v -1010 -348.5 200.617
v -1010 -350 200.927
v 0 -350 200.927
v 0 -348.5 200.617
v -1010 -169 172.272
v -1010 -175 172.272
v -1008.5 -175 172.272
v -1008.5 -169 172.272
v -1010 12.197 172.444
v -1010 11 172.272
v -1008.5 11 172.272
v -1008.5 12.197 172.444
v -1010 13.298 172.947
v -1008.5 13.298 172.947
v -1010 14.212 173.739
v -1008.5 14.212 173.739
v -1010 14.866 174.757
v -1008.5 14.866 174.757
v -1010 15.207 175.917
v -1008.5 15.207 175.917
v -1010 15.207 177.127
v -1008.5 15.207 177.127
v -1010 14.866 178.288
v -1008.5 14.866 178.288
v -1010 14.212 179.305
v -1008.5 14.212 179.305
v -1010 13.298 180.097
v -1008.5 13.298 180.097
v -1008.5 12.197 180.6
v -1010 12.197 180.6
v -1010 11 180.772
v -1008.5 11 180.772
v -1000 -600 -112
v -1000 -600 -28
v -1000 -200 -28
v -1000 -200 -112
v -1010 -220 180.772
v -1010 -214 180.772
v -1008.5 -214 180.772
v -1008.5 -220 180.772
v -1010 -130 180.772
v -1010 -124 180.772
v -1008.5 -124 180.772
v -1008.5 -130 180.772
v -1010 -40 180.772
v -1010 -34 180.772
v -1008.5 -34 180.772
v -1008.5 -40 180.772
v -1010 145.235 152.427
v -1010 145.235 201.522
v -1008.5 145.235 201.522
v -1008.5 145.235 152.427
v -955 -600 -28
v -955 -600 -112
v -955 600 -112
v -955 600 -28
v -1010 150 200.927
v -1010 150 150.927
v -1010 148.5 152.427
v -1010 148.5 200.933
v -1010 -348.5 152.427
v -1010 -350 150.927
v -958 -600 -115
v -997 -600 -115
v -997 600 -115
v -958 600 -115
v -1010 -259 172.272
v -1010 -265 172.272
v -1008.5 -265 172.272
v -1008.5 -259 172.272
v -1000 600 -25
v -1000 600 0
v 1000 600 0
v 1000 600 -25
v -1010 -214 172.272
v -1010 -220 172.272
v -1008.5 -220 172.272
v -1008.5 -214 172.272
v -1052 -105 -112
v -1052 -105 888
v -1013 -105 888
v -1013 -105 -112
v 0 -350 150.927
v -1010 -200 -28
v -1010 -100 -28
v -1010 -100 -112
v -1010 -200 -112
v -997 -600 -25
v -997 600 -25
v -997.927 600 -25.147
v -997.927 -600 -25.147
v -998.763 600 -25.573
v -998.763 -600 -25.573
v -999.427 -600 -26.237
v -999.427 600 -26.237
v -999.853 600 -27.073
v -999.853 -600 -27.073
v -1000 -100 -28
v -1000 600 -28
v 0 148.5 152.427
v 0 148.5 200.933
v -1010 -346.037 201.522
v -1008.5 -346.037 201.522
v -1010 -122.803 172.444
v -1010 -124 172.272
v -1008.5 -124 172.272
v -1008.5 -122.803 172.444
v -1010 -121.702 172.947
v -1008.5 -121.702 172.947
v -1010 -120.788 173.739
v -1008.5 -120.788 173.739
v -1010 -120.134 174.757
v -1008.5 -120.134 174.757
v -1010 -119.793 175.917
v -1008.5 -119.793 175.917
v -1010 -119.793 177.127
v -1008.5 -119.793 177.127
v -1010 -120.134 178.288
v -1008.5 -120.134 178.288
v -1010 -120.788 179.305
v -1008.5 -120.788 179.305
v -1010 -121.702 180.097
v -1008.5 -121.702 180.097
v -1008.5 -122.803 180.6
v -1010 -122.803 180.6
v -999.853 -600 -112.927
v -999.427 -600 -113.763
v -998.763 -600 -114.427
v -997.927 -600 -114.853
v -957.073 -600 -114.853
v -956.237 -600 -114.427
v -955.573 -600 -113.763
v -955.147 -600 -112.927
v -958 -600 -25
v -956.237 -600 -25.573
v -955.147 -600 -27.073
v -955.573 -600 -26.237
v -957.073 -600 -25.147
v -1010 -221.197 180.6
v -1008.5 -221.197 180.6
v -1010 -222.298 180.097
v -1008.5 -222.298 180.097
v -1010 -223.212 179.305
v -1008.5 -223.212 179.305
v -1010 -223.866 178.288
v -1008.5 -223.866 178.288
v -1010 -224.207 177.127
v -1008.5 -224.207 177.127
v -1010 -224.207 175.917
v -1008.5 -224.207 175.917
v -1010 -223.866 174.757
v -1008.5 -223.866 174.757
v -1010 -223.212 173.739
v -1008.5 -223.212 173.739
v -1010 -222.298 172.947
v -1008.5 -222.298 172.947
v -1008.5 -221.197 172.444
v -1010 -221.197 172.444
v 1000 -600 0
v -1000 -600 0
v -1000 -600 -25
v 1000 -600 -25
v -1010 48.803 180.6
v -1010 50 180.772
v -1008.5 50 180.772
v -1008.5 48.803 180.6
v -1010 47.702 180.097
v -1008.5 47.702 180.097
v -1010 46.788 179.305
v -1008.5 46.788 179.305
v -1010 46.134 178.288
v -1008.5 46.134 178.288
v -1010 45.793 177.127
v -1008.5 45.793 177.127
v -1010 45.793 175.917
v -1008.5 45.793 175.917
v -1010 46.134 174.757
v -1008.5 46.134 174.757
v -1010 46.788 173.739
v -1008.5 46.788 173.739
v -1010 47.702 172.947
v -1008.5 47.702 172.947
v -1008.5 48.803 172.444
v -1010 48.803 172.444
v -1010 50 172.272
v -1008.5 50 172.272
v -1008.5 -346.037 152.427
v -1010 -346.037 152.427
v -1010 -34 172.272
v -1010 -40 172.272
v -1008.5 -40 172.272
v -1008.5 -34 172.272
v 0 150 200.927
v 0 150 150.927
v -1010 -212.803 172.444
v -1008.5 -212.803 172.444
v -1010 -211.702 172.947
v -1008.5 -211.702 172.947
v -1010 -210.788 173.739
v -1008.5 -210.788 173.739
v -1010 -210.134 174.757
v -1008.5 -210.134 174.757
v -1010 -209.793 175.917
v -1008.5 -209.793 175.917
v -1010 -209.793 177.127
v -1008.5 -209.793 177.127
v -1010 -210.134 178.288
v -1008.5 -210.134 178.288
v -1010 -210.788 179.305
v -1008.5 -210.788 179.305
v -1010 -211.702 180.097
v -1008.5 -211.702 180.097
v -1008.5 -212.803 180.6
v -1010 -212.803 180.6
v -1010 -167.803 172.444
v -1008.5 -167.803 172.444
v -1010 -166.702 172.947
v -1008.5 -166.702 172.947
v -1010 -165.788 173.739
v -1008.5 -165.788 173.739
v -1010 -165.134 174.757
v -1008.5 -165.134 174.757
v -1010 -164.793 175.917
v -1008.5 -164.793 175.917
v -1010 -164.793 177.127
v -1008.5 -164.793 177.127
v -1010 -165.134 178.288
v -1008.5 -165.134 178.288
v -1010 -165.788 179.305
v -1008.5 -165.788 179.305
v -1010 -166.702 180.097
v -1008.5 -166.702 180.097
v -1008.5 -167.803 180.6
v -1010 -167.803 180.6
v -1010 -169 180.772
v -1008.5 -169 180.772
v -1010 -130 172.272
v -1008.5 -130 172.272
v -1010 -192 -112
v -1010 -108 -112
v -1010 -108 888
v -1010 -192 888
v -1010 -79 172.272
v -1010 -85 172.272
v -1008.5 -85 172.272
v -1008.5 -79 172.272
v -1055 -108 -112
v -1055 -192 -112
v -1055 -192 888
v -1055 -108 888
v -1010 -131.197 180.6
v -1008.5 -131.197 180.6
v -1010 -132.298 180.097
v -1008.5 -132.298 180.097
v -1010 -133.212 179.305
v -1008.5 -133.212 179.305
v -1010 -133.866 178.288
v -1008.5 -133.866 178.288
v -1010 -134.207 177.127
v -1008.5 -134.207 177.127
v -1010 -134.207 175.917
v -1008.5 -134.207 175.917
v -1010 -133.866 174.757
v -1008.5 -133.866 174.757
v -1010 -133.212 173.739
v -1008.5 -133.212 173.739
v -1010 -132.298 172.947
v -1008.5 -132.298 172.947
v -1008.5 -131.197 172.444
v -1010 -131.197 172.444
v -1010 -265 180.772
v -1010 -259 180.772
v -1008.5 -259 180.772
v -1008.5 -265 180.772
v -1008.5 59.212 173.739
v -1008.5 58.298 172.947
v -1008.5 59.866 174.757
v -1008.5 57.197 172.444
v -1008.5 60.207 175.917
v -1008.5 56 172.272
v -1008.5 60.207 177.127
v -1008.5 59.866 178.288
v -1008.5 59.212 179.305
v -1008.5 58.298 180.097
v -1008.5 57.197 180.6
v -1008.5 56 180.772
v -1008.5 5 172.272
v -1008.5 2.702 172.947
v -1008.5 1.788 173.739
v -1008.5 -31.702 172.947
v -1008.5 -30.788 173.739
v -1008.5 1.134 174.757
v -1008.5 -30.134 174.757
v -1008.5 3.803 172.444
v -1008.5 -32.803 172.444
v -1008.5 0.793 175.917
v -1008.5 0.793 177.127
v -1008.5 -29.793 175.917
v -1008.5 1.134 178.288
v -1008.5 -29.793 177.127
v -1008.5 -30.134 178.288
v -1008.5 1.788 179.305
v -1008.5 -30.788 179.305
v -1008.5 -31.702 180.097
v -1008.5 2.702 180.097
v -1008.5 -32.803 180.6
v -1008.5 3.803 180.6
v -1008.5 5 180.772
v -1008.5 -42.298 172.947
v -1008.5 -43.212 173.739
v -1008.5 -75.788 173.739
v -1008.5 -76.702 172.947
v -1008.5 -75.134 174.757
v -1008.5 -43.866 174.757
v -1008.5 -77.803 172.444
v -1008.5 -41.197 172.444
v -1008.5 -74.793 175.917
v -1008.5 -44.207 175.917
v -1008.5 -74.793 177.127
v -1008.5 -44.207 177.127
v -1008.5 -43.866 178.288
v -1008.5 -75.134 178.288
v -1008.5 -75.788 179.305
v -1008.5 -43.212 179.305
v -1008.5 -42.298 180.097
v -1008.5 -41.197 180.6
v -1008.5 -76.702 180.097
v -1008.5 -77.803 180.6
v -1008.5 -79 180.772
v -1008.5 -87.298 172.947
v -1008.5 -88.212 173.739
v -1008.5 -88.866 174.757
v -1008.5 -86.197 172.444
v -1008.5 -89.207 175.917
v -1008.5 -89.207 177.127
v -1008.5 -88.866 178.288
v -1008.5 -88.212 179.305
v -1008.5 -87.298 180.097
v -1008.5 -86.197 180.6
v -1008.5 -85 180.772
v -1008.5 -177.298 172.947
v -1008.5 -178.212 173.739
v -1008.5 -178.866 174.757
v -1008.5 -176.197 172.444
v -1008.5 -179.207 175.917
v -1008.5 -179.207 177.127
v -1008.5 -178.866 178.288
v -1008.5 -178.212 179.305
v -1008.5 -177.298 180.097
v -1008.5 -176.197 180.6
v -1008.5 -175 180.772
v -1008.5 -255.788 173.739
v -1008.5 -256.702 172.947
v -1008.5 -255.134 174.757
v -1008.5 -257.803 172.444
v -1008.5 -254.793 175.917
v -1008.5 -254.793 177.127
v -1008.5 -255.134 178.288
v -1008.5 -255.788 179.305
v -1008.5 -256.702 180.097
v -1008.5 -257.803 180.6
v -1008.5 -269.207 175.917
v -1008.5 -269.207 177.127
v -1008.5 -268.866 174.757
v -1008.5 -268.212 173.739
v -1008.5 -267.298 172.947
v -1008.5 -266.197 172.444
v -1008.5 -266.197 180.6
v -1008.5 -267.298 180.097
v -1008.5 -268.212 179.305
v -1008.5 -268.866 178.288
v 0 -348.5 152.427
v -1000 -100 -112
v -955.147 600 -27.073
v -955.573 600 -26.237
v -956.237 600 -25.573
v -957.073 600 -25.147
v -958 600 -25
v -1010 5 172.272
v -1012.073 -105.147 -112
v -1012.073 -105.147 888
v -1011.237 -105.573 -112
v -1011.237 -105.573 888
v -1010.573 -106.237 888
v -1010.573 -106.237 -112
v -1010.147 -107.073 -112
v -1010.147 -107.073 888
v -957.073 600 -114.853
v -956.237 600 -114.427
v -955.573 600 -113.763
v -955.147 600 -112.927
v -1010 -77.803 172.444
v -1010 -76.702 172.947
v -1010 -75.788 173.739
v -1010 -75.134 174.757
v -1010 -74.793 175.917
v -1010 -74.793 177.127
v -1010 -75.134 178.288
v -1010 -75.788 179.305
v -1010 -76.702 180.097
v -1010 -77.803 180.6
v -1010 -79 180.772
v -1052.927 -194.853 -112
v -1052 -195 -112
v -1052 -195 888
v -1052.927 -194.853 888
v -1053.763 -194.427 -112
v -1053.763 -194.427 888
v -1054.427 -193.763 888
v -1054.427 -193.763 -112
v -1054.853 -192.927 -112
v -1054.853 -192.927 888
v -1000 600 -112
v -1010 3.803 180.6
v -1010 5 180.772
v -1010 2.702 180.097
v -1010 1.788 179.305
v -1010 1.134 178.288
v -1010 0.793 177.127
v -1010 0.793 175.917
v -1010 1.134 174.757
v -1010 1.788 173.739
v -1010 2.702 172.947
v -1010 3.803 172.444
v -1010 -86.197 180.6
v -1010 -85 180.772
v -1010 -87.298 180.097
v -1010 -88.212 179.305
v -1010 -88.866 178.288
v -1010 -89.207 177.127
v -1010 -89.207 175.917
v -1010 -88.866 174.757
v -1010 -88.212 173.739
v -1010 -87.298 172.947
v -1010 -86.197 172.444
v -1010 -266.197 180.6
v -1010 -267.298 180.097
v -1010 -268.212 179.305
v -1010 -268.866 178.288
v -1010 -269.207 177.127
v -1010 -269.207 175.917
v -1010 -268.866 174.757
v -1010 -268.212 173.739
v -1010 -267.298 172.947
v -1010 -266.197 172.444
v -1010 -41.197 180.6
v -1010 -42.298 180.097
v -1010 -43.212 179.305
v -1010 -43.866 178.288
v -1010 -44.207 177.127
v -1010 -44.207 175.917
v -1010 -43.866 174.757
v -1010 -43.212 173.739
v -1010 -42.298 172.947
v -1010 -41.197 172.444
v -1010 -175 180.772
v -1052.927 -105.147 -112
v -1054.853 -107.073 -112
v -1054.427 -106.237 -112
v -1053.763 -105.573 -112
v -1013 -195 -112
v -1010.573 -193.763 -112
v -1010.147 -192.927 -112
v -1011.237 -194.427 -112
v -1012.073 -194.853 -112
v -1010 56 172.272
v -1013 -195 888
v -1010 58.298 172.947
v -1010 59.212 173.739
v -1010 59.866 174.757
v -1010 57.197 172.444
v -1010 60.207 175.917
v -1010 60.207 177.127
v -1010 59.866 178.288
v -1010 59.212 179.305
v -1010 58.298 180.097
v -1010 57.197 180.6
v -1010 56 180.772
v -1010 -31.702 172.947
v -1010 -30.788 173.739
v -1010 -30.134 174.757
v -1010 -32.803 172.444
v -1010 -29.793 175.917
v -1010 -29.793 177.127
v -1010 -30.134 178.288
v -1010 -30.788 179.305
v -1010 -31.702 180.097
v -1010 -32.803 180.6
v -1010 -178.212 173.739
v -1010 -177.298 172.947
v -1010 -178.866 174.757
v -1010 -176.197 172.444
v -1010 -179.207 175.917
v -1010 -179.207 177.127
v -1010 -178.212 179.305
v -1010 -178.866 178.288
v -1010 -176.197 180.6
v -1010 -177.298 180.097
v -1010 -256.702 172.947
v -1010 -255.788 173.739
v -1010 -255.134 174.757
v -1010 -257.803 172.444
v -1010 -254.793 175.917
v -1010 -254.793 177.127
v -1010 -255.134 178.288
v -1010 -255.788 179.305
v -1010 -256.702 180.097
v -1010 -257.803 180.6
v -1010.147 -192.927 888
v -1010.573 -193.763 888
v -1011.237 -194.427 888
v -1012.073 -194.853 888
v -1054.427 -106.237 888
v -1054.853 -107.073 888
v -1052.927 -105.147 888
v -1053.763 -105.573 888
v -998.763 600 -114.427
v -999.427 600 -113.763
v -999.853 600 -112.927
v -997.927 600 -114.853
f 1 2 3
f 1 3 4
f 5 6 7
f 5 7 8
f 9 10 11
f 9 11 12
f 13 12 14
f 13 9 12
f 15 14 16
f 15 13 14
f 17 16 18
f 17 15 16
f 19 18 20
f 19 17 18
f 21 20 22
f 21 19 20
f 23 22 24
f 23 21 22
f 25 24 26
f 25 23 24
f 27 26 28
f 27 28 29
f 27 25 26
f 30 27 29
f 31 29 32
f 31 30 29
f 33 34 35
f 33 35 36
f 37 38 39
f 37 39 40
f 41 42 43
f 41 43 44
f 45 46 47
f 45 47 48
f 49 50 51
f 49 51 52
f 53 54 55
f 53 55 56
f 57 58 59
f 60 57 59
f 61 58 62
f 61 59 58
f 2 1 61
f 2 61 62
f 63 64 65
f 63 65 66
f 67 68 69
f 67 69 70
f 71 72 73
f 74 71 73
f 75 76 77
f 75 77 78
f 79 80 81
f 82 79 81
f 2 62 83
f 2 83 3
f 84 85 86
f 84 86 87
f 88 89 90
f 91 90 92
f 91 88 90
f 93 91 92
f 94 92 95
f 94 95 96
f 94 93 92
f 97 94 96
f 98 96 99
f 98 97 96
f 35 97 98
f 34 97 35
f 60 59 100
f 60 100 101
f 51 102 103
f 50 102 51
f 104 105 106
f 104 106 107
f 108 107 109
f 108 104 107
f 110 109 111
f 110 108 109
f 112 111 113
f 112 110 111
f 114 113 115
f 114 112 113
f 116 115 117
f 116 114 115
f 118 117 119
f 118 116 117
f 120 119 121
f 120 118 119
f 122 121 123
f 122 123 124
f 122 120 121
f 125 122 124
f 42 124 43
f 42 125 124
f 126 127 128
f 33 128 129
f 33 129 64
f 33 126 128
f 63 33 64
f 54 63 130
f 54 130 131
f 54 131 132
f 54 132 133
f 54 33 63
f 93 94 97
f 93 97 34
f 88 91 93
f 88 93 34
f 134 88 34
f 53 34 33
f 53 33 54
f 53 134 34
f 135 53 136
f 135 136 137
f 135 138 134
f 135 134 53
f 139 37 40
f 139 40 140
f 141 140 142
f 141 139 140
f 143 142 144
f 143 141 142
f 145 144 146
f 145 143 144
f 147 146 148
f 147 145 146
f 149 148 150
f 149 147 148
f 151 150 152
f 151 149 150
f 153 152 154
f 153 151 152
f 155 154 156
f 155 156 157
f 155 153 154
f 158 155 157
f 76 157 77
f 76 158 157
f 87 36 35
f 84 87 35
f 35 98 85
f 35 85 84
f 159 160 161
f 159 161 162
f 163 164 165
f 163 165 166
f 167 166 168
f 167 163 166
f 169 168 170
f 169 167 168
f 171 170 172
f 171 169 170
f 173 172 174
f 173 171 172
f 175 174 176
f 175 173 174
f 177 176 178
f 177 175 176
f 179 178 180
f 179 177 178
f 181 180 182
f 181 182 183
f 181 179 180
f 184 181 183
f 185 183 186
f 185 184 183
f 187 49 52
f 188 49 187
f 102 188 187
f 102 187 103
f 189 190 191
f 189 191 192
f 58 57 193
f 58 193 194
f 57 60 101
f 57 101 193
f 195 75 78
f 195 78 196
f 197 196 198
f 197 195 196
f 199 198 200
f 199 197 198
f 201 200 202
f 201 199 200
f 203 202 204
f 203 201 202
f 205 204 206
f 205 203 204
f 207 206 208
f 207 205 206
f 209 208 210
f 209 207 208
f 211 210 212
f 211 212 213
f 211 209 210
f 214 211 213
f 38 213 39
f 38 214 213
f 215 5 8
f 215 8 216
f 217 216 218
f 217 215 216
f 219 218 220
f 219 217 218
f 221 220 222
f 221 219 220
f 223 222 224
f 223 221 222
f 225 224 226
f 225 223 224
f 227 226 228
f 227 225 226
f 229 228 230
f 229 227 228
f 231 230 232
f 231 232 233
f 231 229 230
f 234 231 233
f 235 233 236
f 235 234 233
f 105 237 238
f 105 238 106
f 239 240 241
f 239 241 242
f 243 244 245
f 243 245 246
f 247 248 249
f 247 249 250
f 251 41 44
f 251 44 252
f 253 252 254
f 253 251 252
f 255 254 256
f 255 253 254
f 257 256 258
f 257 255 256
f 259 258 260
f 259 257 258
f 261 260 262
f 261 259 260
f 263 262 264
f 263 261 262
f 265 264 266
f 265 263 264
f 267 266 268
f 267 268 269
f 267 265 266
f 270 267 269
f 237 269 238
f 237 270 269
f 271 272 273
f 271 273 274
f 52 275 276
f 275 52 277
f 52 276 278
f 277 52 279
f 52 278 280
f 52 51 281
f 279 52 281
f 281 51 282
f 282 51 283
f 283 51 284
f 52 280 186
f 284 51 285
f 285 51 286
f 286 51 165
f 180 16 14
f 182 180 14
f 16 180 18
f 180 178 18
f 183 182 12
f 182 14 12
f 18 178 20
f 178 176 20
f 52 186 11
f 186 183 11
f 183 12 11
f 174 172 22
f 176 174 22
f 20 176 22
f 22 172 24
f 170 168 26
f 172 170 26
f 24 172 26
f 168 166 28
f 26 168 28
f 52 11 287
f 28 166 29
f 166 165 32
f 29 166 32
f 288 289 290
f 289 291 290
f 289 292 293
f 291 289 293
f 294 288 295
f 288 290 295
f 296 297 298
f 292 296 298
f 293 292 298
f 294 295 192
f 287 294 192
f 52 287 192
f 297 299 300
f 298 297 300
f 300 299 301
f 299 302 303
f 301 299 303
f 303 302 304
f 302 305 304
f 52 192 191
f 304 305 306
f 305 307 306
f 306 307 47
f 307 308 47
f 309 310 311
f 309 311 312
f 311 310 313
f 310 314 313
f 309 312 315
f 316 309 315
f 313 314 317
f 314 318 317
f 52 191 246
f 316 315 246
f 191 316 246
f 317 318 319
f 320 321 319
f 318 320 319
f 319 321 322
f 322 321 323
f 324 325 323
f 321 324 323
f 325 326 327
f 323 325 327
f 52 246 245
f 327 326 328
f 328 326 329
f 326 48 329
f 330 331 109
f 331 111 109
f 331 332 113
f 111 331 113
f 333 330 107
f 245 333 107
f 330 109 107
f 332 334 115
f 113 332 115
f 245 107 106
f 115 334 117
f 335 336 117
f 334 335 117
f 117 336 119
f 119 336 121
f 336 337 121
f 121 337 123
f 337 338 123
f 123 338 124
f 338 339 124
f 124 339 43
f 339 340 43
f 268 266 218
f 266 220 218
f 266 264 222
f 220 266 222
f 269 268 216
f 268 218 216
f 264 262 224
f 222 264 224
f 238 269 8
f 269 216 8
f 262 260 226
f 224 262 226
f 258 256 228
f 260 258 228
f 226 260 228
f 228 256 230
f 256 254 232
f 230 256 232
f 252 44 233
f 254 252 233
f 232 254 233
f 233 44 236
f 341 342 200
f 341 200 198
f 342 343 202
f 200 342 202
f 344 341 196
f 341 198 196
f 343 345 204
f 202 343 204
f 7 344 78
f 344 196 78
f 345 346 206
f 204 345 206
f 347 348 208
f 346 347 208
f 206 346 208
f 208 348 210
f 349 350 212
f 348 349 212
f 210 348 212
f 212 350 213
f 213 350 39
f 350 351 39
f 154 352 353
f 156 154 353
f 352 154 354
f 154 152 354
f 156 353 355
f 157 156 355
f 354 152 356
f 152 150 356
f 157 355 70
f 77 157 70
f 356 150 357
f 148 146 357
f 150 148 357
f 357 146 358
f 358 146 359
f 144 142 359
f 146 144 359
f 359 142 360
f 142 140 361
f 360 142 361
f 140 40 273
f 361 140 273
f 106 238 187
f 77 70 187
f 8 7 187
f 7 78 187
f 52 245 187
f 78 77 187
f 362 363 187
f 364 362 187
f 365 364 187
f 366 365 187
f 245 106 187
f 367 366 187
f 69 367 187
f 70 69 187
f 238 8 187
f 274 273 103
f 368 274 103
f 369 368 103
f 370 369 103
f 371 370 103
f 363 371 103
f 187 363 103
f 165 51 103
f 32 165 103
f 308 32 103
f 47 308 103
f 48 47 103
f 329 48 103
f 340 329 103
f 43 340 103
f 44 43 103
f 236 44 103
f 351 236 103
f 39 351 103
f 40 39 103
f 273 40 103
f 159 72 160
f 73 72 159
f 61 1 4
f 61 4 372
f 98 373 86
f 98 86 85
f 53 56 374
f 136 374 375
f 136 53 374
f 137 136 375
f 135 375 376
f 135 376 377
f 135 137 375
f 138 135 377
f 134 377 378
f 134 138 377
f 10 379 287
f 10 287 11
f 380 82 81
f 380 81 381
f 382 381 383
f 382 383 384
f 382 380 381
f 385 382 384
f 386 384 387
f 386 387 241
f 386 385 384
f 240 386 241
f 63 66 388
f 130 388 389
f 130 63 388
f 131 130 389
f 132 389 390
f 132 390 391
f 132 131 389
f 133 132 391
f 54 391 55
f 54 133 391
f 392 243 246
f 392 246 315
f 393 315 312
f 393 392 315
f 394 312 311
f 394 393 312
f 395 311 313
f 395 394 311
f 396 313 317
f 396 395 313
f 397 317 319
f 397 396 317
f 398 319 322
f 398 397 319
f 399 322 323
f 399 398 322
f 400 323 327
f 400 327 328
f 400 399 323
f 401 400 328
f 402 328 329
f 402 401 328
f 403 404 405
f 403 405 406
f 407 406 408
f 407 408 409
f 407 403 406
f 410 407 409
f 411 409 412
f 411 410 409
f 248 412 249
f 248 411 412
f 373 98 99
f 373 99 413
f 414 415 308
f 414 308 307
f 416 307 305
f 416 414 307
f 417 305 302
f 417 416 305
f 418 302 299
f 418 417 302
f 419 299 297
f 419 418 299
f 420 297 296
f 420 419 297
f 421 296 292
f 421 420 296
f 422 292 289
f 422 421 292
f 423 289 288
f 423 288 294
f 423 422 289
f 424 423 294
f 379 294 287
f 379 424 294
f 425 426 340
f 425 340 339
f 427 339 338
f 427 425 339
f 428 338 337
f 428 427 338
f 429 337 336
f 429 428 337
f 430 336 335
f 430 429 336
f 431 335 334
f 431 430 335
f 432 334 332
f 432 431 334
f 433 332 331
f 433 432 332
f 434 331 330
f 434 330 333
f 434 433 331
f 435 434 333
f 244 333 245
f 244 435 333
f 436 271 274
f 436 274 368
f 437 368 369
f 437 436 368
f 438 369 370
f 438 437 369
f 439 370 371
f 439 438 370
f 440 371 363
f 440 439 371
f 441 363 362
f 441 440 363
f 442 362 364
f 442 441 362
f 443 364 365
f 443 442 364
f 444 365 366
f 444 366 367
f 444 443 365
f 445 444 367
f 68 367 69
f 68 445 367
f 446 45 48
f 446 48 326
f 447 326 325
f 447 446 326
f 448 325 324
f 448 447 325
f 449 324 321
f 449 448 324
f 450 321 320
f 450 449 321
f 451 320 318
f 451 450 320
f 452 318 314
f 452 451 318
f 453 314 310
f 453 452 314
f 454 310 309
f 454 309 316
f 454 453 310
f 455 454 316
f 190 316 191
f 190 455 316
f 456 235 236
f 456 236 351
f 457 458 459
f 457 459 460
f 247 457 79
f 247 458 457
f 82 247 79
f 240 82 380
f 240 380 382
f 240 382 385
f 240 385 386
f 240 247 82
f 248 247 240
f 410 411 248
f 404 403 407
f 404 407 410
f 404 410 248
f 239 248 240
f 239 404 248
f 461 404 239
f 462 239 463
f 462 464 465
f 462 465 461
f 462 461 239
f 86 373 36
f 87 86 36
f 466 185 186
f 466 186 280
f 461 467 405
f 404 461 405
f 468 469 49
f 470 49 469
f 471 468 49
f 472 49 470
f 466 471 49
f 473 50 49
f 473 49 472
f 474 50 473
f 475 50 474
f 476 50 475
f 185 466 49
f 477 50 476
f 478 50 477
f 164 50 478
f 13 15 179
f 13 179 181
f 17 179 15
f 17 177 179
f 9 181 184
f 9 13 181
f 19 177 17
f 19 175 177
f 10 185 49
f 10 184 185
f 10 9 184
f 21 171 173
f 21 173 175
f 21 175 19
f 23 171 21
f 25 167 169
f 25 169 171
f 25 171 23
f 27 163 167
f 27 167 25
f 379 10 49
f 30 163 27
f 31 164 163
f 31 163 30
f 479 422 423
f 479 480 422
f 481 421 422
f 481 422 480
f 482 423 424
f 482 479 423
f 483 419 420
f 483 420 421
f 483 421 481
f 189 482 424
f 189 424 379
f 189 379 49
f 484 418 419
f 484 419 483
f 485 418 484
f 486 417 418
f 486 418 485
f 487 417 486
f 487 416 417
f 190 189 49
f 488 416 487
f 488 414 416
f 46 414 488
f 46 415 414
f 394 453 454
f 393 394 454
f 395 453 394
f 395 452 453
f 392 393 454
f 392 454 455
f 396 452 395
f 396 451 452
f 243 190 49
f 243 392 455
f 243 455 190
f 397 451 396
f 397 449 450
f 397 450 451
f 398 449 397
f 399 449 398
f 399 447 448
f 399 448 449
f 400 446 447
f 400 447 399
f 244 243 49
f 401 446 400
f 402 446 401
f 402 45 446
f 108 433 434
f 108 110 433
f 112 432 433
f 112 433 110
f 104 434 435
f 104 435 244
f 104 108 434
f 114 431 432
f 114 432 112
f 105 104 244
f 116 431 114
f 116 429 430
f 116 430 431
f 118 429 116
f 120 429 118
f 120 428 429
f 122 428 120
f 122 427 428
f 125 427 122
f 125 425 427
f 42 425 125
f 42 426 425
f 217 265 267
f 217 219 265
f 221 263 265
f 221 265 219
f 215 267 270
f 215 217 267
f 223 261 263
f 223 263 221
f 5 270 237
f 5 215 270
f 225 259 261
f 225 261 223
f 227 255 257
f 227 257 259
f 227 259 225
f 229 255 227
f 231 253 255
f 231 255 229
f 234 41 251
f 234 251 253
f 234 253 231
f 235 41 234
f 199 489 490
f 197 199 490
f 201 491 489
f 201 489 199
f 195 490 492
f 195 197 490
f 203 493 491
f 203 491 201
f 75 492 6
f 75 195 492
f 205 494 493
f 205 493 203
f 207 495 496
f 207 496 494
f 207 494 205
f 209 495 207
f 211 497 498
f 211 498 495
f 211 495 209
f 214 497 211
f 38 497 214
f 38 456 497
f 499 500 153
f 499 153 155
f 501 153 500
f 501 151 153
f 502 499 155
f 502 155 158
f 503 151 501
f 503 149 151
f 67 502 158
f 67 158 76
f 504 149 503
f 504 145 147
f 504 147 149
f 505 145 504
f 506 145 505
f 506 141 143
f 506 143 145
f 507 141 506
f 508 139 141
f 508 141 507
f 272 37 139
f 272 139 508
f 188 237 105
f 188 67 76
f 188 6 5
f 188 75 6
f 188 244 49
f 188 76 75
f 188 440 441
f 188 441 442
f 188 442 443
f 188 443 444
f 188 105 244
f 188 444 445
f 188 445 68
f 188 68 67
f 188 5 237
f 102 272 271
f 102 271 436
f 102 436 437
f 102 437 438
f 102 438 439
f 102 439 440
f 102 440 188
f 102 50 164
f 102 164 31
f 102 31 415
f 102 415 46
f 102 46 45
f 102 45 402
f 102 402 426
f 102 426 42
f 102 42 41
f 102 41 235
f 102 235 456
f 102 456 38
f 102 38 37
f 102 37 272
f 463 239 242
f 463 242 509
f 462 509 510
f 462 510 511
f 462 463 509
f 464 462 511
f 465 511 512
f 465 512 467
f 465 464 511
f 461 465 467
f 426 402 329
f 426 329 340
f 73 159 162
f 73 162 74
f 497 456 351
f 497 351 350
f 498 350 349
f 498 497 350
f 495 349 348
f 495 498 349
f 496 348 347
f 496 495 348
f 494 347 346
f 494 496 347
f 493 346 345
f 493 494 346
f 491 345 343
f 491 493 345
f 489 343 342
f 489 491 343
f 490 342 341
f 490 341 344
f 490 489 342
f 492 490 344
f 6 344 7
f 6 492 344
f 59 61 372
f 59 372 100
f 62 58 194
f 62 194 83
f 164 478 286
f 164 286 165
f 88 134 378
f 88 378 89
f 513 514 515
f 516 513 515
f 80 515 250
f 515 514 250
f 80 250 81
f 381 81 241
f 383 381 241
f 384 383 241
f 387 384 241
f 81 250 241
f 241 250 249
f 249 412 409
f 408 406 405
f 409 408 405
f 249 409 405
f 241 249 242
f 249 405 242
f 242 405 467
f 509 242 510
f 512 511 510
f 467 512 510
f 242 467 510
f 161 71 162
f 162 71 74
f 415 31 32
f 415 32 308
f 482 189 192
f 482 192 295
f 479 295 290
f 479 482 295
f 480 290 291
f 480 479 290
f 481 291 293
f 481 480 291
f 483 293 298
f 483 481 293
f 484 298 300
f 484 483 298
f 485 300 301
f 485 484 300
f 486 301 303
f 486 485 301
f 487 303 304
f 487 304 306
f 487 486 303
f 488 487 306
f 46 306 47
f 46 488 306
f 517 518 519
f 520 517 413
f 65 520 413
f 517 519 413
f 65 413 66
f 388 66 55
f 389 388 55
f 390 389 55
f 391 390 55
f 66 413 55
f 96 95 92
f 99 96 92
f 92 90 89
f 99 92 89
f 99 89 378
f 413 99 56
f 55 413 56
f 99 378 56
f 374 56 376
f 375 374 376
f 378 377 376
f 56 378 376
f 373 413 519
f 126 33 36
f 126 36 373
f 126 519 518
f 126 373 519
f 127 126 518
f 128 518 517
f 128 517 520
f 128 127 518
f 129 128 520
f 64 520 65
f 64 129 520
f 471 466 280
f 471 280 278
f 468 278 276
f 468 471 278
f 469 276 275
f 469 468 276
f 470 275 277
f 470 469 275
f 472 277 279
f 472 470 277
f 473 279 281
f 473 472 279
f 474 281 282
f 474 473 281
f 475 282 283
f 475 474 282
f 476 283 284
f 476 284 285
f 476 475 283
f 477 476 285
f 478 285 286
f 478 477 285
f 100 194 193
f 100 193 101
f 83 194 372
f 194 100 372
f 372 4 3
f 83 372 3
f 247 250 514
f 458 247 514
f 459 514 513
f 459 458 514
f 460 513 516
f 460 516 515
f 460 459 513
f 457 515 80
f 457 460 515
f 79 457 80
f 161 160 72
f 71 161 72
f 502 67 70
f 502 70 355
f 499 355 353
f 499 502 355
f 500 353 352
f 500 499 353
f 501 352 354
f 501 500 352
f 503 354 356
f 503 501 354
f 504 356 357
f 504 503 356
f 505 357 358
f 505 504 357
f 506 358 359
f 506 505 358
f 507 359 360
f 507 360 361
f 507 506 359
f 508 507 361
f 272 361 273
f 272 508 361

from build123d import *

# Parameters (mm, degrees)
F0_W      = 2000
F0_H      = 1200
F1_DEPTH  = 25
F3_DEPTH  = 1200
F6_W      = 100
F6_H      = 84
F7_DEPTH  = 10
F9_DEPTH  = 1.5
F10_DEPTH = 1010
F12_DEPTH = 1000


with BuildPart() as f1:
    # F0 (on Top) → F1 (new body)
    with BuildSketch(Plane.XY):
        Rectangle(F0_W, F0_H)
    extrude(amount=-F1_DEPTH)


with BuildPart() as f3:
    # F2 (on face) → F3 (new body)
    with BuildSketch(Plane.XZ.offset(600)):
        with BuildLine():
            Line((-958, -25), (-997, -25))
            ThreePointArc((-997, -25), (-999.12132, -25.87868), (-1000, -28))
            Line((-1000, -28), (-1000, -112))
            ThreePointArc((-1000, -112), (-999.12132, -114.12132), (-997, -115))
            Line((-997, -115), (-958, -115))
            ThreePointArc((-958, -115), (-955.87868, -114.12132), (-955, -112))
            Line((-955, -112), (-955, -28))
            ThreePointArc((-955, -28), (-955.87868, -25.87868), (-958, -25))
        make_face()
    extrude(amount=-F3_DEPTH)

    # F6 (on face) → F7 (join)
    with BuildSketch(Plane(origin=(-1000, 0, 0), x_dir=(0, -1, 0), z_dir=(-1, 0, 0))):
        with Locations((150, -70)):
            Rectangle(F6_W, F6_H)
    extrude(amount=F7_DEPTH)


with BuildPart() as f9:
    # F8 (on face) → F9 (new body)
    with BuildSketch(Plane(origin=(-1010, 0, 0), x_dir=(0, -1, 0), z_dir=(-1, 0, 0))):
        Polygon((-145.235375, 152.426902), (346.03707, 152.426902), (346.03707, 201.522042), (-145.235375, 201.522042), (-145.235375, 166.426902), align=None)
        with BuildLine():
            ThreePointArc((-56, 172.272042), (-60.25, 176.522042), (-56, 180.772042))
            Line((-56, 180.772042), (-50, 180.772042))
            ThreePointArc((-50, 180.772042), (-45.75, 176.522042), (-50, 172.272042))
            Line((-50, 172.272042), (-56, 172.272042))
        make_face(mode=Mode.SUBTRACT)
        with BuildLine():
            ThreePointArc((-5, 180.772042), (-0.75, 176.522042), (-5, 172.272042))
            Line((-5, 172.272042), (-11, 172.272042))
            ThreePointArc((-11, 172.272042), (-15.25, 176.522042), (-11, 180.772042))
            Line((-11, 180.772042), (-5, 180.772042))
        make_face(mode=Mode.SUBTRACT)
        with BuildLine():
            ThreePointArc((40, 180.772042), (44.25, 176.522042), (40, 172.272042))
            Line((40, 172.272042), (34, 172.272042))
            ThreePointArc((34, 172.272042), (29.75, 176.522042), (34, 180.772042))
            Line((34, 180.772042), (40, 180.772042))
        make_face(mode=Mode.SUBTRACT)
        with BuildLine():
            ThreePointArc((85, 180.772042), (89.25, 176.522042), (85, 172.272042))
            Line((85, 172.272042), (79, 172.272042))
            ThreePointArc((79, 172.272042), (74.75, 176.522042), (79, 180.772042))
            Line((79, 180.772042), (85, 180.772042))
        make_face(mode=Mode.SUBTRACT)
        with BuildLine():
            ThreePointArc((130, 180.772042), (134.25, 176.522042), (130, 172.272042))
            Line((130, 172.272042), (124, 172.272042))
            ThreePointArc((124, 172.272042), (119.75, 176.522042), (124, 180.772042))
            Line((124, 180.772042), (130, 180.772042))
        make_face(mode=Mode.SUBTRACT)
        with BuildLine():
            ThreePointArc((175, 180.772042), (179.25, 176.522042), (175, 172.272042))
            Line((175, 172.272042), (169, 172.272042))
            ThreePointArc((169, 172.272042), (164.75, 176.522042), (169, 180.772042))
            Line((169, 180.772042), (175, 180.772042))
        make_face(mode=Mode.SUBTRACT)
        with BuildLine():
            ThreePointArc((220, 180.772042), (224.25, 176.522042), (220, 172.272042))
            Line((220, 172.272042), (214, 172.272042))
            ThreePointArc((214, 172.272042), (209.75, 176.522042), (214, 180.772042))
            Line((214, 180.772042), (220, 180.772042))
        make_face(mode=Mode.SUBTRACT)
        with BuildLine():
            ThreePointArc((265, 180.772042), (269.25, 176.522042), (265, 172.272042))
            Line((265, 172.272042), (259, 172.272042))
            ThreePointArc((259, 172.272042), (254.75, 176.522042), (259, 180.772042))
            Line((259, 180.772042), (265, 180.772042))
        make_face(mode=Mode.SUBTRACT)
    extrude(amount=-F9_DEPTH)


with BuildPart() as f10:
    # F8 (on face) → F10 (new body, through all)
    with BuildSketch(Plane(origin=(-1010, 0, 0), x_dir=(0, -1, 0), z_dir=(-1, 0, 0))):
        Polygon((-150, 150.926902), (350, 150.926902), (350, 200.926902), (348.5, 200.617183), (348.5, 152.426902), (346.03707, 152.426902), (-145.235375, 152.426902), (-148.5, 152.426902), (-148.5, 200.932626), (-150, 200.926902), align=None)
    extrude(amount=-F10_DEPTH)


with BuildPart() as f12:
    # F11 (on face) → F12 (new body)
    with BuildSketch(Plane(origin=(0, 0, -112), x_dir=(1, 0, 0), z_dir=(0, 0, -1))):
        with BuildLine():
            ThreePointArc((-1010, 192), (-1010.87868, 194.12132), (-1013, 195))
            Line((-1013, 195), (-1052, 195))
            ThreePointArc((-1052, 195), (-1054.12132, 194.12132), (-1055, 192))
            Line((-1055, 192), (-1055, 108))
            ThreePointArc((-1055, 108), (-1054.12132, 105.87868), (-1052, 105))
            Line((-1052, 105), (-1013, 105))
            ThreePointArc((-1013, 105), (-1010.87868, 105.87868), (-1010, 108))
            Line((-1010, 108), (-1010, 192))
        make_face()
    extrude(amount=-F12_DEPTH)


solid = Compound([f1.part, f3.part, f9.part, f10.part, f12.part])
